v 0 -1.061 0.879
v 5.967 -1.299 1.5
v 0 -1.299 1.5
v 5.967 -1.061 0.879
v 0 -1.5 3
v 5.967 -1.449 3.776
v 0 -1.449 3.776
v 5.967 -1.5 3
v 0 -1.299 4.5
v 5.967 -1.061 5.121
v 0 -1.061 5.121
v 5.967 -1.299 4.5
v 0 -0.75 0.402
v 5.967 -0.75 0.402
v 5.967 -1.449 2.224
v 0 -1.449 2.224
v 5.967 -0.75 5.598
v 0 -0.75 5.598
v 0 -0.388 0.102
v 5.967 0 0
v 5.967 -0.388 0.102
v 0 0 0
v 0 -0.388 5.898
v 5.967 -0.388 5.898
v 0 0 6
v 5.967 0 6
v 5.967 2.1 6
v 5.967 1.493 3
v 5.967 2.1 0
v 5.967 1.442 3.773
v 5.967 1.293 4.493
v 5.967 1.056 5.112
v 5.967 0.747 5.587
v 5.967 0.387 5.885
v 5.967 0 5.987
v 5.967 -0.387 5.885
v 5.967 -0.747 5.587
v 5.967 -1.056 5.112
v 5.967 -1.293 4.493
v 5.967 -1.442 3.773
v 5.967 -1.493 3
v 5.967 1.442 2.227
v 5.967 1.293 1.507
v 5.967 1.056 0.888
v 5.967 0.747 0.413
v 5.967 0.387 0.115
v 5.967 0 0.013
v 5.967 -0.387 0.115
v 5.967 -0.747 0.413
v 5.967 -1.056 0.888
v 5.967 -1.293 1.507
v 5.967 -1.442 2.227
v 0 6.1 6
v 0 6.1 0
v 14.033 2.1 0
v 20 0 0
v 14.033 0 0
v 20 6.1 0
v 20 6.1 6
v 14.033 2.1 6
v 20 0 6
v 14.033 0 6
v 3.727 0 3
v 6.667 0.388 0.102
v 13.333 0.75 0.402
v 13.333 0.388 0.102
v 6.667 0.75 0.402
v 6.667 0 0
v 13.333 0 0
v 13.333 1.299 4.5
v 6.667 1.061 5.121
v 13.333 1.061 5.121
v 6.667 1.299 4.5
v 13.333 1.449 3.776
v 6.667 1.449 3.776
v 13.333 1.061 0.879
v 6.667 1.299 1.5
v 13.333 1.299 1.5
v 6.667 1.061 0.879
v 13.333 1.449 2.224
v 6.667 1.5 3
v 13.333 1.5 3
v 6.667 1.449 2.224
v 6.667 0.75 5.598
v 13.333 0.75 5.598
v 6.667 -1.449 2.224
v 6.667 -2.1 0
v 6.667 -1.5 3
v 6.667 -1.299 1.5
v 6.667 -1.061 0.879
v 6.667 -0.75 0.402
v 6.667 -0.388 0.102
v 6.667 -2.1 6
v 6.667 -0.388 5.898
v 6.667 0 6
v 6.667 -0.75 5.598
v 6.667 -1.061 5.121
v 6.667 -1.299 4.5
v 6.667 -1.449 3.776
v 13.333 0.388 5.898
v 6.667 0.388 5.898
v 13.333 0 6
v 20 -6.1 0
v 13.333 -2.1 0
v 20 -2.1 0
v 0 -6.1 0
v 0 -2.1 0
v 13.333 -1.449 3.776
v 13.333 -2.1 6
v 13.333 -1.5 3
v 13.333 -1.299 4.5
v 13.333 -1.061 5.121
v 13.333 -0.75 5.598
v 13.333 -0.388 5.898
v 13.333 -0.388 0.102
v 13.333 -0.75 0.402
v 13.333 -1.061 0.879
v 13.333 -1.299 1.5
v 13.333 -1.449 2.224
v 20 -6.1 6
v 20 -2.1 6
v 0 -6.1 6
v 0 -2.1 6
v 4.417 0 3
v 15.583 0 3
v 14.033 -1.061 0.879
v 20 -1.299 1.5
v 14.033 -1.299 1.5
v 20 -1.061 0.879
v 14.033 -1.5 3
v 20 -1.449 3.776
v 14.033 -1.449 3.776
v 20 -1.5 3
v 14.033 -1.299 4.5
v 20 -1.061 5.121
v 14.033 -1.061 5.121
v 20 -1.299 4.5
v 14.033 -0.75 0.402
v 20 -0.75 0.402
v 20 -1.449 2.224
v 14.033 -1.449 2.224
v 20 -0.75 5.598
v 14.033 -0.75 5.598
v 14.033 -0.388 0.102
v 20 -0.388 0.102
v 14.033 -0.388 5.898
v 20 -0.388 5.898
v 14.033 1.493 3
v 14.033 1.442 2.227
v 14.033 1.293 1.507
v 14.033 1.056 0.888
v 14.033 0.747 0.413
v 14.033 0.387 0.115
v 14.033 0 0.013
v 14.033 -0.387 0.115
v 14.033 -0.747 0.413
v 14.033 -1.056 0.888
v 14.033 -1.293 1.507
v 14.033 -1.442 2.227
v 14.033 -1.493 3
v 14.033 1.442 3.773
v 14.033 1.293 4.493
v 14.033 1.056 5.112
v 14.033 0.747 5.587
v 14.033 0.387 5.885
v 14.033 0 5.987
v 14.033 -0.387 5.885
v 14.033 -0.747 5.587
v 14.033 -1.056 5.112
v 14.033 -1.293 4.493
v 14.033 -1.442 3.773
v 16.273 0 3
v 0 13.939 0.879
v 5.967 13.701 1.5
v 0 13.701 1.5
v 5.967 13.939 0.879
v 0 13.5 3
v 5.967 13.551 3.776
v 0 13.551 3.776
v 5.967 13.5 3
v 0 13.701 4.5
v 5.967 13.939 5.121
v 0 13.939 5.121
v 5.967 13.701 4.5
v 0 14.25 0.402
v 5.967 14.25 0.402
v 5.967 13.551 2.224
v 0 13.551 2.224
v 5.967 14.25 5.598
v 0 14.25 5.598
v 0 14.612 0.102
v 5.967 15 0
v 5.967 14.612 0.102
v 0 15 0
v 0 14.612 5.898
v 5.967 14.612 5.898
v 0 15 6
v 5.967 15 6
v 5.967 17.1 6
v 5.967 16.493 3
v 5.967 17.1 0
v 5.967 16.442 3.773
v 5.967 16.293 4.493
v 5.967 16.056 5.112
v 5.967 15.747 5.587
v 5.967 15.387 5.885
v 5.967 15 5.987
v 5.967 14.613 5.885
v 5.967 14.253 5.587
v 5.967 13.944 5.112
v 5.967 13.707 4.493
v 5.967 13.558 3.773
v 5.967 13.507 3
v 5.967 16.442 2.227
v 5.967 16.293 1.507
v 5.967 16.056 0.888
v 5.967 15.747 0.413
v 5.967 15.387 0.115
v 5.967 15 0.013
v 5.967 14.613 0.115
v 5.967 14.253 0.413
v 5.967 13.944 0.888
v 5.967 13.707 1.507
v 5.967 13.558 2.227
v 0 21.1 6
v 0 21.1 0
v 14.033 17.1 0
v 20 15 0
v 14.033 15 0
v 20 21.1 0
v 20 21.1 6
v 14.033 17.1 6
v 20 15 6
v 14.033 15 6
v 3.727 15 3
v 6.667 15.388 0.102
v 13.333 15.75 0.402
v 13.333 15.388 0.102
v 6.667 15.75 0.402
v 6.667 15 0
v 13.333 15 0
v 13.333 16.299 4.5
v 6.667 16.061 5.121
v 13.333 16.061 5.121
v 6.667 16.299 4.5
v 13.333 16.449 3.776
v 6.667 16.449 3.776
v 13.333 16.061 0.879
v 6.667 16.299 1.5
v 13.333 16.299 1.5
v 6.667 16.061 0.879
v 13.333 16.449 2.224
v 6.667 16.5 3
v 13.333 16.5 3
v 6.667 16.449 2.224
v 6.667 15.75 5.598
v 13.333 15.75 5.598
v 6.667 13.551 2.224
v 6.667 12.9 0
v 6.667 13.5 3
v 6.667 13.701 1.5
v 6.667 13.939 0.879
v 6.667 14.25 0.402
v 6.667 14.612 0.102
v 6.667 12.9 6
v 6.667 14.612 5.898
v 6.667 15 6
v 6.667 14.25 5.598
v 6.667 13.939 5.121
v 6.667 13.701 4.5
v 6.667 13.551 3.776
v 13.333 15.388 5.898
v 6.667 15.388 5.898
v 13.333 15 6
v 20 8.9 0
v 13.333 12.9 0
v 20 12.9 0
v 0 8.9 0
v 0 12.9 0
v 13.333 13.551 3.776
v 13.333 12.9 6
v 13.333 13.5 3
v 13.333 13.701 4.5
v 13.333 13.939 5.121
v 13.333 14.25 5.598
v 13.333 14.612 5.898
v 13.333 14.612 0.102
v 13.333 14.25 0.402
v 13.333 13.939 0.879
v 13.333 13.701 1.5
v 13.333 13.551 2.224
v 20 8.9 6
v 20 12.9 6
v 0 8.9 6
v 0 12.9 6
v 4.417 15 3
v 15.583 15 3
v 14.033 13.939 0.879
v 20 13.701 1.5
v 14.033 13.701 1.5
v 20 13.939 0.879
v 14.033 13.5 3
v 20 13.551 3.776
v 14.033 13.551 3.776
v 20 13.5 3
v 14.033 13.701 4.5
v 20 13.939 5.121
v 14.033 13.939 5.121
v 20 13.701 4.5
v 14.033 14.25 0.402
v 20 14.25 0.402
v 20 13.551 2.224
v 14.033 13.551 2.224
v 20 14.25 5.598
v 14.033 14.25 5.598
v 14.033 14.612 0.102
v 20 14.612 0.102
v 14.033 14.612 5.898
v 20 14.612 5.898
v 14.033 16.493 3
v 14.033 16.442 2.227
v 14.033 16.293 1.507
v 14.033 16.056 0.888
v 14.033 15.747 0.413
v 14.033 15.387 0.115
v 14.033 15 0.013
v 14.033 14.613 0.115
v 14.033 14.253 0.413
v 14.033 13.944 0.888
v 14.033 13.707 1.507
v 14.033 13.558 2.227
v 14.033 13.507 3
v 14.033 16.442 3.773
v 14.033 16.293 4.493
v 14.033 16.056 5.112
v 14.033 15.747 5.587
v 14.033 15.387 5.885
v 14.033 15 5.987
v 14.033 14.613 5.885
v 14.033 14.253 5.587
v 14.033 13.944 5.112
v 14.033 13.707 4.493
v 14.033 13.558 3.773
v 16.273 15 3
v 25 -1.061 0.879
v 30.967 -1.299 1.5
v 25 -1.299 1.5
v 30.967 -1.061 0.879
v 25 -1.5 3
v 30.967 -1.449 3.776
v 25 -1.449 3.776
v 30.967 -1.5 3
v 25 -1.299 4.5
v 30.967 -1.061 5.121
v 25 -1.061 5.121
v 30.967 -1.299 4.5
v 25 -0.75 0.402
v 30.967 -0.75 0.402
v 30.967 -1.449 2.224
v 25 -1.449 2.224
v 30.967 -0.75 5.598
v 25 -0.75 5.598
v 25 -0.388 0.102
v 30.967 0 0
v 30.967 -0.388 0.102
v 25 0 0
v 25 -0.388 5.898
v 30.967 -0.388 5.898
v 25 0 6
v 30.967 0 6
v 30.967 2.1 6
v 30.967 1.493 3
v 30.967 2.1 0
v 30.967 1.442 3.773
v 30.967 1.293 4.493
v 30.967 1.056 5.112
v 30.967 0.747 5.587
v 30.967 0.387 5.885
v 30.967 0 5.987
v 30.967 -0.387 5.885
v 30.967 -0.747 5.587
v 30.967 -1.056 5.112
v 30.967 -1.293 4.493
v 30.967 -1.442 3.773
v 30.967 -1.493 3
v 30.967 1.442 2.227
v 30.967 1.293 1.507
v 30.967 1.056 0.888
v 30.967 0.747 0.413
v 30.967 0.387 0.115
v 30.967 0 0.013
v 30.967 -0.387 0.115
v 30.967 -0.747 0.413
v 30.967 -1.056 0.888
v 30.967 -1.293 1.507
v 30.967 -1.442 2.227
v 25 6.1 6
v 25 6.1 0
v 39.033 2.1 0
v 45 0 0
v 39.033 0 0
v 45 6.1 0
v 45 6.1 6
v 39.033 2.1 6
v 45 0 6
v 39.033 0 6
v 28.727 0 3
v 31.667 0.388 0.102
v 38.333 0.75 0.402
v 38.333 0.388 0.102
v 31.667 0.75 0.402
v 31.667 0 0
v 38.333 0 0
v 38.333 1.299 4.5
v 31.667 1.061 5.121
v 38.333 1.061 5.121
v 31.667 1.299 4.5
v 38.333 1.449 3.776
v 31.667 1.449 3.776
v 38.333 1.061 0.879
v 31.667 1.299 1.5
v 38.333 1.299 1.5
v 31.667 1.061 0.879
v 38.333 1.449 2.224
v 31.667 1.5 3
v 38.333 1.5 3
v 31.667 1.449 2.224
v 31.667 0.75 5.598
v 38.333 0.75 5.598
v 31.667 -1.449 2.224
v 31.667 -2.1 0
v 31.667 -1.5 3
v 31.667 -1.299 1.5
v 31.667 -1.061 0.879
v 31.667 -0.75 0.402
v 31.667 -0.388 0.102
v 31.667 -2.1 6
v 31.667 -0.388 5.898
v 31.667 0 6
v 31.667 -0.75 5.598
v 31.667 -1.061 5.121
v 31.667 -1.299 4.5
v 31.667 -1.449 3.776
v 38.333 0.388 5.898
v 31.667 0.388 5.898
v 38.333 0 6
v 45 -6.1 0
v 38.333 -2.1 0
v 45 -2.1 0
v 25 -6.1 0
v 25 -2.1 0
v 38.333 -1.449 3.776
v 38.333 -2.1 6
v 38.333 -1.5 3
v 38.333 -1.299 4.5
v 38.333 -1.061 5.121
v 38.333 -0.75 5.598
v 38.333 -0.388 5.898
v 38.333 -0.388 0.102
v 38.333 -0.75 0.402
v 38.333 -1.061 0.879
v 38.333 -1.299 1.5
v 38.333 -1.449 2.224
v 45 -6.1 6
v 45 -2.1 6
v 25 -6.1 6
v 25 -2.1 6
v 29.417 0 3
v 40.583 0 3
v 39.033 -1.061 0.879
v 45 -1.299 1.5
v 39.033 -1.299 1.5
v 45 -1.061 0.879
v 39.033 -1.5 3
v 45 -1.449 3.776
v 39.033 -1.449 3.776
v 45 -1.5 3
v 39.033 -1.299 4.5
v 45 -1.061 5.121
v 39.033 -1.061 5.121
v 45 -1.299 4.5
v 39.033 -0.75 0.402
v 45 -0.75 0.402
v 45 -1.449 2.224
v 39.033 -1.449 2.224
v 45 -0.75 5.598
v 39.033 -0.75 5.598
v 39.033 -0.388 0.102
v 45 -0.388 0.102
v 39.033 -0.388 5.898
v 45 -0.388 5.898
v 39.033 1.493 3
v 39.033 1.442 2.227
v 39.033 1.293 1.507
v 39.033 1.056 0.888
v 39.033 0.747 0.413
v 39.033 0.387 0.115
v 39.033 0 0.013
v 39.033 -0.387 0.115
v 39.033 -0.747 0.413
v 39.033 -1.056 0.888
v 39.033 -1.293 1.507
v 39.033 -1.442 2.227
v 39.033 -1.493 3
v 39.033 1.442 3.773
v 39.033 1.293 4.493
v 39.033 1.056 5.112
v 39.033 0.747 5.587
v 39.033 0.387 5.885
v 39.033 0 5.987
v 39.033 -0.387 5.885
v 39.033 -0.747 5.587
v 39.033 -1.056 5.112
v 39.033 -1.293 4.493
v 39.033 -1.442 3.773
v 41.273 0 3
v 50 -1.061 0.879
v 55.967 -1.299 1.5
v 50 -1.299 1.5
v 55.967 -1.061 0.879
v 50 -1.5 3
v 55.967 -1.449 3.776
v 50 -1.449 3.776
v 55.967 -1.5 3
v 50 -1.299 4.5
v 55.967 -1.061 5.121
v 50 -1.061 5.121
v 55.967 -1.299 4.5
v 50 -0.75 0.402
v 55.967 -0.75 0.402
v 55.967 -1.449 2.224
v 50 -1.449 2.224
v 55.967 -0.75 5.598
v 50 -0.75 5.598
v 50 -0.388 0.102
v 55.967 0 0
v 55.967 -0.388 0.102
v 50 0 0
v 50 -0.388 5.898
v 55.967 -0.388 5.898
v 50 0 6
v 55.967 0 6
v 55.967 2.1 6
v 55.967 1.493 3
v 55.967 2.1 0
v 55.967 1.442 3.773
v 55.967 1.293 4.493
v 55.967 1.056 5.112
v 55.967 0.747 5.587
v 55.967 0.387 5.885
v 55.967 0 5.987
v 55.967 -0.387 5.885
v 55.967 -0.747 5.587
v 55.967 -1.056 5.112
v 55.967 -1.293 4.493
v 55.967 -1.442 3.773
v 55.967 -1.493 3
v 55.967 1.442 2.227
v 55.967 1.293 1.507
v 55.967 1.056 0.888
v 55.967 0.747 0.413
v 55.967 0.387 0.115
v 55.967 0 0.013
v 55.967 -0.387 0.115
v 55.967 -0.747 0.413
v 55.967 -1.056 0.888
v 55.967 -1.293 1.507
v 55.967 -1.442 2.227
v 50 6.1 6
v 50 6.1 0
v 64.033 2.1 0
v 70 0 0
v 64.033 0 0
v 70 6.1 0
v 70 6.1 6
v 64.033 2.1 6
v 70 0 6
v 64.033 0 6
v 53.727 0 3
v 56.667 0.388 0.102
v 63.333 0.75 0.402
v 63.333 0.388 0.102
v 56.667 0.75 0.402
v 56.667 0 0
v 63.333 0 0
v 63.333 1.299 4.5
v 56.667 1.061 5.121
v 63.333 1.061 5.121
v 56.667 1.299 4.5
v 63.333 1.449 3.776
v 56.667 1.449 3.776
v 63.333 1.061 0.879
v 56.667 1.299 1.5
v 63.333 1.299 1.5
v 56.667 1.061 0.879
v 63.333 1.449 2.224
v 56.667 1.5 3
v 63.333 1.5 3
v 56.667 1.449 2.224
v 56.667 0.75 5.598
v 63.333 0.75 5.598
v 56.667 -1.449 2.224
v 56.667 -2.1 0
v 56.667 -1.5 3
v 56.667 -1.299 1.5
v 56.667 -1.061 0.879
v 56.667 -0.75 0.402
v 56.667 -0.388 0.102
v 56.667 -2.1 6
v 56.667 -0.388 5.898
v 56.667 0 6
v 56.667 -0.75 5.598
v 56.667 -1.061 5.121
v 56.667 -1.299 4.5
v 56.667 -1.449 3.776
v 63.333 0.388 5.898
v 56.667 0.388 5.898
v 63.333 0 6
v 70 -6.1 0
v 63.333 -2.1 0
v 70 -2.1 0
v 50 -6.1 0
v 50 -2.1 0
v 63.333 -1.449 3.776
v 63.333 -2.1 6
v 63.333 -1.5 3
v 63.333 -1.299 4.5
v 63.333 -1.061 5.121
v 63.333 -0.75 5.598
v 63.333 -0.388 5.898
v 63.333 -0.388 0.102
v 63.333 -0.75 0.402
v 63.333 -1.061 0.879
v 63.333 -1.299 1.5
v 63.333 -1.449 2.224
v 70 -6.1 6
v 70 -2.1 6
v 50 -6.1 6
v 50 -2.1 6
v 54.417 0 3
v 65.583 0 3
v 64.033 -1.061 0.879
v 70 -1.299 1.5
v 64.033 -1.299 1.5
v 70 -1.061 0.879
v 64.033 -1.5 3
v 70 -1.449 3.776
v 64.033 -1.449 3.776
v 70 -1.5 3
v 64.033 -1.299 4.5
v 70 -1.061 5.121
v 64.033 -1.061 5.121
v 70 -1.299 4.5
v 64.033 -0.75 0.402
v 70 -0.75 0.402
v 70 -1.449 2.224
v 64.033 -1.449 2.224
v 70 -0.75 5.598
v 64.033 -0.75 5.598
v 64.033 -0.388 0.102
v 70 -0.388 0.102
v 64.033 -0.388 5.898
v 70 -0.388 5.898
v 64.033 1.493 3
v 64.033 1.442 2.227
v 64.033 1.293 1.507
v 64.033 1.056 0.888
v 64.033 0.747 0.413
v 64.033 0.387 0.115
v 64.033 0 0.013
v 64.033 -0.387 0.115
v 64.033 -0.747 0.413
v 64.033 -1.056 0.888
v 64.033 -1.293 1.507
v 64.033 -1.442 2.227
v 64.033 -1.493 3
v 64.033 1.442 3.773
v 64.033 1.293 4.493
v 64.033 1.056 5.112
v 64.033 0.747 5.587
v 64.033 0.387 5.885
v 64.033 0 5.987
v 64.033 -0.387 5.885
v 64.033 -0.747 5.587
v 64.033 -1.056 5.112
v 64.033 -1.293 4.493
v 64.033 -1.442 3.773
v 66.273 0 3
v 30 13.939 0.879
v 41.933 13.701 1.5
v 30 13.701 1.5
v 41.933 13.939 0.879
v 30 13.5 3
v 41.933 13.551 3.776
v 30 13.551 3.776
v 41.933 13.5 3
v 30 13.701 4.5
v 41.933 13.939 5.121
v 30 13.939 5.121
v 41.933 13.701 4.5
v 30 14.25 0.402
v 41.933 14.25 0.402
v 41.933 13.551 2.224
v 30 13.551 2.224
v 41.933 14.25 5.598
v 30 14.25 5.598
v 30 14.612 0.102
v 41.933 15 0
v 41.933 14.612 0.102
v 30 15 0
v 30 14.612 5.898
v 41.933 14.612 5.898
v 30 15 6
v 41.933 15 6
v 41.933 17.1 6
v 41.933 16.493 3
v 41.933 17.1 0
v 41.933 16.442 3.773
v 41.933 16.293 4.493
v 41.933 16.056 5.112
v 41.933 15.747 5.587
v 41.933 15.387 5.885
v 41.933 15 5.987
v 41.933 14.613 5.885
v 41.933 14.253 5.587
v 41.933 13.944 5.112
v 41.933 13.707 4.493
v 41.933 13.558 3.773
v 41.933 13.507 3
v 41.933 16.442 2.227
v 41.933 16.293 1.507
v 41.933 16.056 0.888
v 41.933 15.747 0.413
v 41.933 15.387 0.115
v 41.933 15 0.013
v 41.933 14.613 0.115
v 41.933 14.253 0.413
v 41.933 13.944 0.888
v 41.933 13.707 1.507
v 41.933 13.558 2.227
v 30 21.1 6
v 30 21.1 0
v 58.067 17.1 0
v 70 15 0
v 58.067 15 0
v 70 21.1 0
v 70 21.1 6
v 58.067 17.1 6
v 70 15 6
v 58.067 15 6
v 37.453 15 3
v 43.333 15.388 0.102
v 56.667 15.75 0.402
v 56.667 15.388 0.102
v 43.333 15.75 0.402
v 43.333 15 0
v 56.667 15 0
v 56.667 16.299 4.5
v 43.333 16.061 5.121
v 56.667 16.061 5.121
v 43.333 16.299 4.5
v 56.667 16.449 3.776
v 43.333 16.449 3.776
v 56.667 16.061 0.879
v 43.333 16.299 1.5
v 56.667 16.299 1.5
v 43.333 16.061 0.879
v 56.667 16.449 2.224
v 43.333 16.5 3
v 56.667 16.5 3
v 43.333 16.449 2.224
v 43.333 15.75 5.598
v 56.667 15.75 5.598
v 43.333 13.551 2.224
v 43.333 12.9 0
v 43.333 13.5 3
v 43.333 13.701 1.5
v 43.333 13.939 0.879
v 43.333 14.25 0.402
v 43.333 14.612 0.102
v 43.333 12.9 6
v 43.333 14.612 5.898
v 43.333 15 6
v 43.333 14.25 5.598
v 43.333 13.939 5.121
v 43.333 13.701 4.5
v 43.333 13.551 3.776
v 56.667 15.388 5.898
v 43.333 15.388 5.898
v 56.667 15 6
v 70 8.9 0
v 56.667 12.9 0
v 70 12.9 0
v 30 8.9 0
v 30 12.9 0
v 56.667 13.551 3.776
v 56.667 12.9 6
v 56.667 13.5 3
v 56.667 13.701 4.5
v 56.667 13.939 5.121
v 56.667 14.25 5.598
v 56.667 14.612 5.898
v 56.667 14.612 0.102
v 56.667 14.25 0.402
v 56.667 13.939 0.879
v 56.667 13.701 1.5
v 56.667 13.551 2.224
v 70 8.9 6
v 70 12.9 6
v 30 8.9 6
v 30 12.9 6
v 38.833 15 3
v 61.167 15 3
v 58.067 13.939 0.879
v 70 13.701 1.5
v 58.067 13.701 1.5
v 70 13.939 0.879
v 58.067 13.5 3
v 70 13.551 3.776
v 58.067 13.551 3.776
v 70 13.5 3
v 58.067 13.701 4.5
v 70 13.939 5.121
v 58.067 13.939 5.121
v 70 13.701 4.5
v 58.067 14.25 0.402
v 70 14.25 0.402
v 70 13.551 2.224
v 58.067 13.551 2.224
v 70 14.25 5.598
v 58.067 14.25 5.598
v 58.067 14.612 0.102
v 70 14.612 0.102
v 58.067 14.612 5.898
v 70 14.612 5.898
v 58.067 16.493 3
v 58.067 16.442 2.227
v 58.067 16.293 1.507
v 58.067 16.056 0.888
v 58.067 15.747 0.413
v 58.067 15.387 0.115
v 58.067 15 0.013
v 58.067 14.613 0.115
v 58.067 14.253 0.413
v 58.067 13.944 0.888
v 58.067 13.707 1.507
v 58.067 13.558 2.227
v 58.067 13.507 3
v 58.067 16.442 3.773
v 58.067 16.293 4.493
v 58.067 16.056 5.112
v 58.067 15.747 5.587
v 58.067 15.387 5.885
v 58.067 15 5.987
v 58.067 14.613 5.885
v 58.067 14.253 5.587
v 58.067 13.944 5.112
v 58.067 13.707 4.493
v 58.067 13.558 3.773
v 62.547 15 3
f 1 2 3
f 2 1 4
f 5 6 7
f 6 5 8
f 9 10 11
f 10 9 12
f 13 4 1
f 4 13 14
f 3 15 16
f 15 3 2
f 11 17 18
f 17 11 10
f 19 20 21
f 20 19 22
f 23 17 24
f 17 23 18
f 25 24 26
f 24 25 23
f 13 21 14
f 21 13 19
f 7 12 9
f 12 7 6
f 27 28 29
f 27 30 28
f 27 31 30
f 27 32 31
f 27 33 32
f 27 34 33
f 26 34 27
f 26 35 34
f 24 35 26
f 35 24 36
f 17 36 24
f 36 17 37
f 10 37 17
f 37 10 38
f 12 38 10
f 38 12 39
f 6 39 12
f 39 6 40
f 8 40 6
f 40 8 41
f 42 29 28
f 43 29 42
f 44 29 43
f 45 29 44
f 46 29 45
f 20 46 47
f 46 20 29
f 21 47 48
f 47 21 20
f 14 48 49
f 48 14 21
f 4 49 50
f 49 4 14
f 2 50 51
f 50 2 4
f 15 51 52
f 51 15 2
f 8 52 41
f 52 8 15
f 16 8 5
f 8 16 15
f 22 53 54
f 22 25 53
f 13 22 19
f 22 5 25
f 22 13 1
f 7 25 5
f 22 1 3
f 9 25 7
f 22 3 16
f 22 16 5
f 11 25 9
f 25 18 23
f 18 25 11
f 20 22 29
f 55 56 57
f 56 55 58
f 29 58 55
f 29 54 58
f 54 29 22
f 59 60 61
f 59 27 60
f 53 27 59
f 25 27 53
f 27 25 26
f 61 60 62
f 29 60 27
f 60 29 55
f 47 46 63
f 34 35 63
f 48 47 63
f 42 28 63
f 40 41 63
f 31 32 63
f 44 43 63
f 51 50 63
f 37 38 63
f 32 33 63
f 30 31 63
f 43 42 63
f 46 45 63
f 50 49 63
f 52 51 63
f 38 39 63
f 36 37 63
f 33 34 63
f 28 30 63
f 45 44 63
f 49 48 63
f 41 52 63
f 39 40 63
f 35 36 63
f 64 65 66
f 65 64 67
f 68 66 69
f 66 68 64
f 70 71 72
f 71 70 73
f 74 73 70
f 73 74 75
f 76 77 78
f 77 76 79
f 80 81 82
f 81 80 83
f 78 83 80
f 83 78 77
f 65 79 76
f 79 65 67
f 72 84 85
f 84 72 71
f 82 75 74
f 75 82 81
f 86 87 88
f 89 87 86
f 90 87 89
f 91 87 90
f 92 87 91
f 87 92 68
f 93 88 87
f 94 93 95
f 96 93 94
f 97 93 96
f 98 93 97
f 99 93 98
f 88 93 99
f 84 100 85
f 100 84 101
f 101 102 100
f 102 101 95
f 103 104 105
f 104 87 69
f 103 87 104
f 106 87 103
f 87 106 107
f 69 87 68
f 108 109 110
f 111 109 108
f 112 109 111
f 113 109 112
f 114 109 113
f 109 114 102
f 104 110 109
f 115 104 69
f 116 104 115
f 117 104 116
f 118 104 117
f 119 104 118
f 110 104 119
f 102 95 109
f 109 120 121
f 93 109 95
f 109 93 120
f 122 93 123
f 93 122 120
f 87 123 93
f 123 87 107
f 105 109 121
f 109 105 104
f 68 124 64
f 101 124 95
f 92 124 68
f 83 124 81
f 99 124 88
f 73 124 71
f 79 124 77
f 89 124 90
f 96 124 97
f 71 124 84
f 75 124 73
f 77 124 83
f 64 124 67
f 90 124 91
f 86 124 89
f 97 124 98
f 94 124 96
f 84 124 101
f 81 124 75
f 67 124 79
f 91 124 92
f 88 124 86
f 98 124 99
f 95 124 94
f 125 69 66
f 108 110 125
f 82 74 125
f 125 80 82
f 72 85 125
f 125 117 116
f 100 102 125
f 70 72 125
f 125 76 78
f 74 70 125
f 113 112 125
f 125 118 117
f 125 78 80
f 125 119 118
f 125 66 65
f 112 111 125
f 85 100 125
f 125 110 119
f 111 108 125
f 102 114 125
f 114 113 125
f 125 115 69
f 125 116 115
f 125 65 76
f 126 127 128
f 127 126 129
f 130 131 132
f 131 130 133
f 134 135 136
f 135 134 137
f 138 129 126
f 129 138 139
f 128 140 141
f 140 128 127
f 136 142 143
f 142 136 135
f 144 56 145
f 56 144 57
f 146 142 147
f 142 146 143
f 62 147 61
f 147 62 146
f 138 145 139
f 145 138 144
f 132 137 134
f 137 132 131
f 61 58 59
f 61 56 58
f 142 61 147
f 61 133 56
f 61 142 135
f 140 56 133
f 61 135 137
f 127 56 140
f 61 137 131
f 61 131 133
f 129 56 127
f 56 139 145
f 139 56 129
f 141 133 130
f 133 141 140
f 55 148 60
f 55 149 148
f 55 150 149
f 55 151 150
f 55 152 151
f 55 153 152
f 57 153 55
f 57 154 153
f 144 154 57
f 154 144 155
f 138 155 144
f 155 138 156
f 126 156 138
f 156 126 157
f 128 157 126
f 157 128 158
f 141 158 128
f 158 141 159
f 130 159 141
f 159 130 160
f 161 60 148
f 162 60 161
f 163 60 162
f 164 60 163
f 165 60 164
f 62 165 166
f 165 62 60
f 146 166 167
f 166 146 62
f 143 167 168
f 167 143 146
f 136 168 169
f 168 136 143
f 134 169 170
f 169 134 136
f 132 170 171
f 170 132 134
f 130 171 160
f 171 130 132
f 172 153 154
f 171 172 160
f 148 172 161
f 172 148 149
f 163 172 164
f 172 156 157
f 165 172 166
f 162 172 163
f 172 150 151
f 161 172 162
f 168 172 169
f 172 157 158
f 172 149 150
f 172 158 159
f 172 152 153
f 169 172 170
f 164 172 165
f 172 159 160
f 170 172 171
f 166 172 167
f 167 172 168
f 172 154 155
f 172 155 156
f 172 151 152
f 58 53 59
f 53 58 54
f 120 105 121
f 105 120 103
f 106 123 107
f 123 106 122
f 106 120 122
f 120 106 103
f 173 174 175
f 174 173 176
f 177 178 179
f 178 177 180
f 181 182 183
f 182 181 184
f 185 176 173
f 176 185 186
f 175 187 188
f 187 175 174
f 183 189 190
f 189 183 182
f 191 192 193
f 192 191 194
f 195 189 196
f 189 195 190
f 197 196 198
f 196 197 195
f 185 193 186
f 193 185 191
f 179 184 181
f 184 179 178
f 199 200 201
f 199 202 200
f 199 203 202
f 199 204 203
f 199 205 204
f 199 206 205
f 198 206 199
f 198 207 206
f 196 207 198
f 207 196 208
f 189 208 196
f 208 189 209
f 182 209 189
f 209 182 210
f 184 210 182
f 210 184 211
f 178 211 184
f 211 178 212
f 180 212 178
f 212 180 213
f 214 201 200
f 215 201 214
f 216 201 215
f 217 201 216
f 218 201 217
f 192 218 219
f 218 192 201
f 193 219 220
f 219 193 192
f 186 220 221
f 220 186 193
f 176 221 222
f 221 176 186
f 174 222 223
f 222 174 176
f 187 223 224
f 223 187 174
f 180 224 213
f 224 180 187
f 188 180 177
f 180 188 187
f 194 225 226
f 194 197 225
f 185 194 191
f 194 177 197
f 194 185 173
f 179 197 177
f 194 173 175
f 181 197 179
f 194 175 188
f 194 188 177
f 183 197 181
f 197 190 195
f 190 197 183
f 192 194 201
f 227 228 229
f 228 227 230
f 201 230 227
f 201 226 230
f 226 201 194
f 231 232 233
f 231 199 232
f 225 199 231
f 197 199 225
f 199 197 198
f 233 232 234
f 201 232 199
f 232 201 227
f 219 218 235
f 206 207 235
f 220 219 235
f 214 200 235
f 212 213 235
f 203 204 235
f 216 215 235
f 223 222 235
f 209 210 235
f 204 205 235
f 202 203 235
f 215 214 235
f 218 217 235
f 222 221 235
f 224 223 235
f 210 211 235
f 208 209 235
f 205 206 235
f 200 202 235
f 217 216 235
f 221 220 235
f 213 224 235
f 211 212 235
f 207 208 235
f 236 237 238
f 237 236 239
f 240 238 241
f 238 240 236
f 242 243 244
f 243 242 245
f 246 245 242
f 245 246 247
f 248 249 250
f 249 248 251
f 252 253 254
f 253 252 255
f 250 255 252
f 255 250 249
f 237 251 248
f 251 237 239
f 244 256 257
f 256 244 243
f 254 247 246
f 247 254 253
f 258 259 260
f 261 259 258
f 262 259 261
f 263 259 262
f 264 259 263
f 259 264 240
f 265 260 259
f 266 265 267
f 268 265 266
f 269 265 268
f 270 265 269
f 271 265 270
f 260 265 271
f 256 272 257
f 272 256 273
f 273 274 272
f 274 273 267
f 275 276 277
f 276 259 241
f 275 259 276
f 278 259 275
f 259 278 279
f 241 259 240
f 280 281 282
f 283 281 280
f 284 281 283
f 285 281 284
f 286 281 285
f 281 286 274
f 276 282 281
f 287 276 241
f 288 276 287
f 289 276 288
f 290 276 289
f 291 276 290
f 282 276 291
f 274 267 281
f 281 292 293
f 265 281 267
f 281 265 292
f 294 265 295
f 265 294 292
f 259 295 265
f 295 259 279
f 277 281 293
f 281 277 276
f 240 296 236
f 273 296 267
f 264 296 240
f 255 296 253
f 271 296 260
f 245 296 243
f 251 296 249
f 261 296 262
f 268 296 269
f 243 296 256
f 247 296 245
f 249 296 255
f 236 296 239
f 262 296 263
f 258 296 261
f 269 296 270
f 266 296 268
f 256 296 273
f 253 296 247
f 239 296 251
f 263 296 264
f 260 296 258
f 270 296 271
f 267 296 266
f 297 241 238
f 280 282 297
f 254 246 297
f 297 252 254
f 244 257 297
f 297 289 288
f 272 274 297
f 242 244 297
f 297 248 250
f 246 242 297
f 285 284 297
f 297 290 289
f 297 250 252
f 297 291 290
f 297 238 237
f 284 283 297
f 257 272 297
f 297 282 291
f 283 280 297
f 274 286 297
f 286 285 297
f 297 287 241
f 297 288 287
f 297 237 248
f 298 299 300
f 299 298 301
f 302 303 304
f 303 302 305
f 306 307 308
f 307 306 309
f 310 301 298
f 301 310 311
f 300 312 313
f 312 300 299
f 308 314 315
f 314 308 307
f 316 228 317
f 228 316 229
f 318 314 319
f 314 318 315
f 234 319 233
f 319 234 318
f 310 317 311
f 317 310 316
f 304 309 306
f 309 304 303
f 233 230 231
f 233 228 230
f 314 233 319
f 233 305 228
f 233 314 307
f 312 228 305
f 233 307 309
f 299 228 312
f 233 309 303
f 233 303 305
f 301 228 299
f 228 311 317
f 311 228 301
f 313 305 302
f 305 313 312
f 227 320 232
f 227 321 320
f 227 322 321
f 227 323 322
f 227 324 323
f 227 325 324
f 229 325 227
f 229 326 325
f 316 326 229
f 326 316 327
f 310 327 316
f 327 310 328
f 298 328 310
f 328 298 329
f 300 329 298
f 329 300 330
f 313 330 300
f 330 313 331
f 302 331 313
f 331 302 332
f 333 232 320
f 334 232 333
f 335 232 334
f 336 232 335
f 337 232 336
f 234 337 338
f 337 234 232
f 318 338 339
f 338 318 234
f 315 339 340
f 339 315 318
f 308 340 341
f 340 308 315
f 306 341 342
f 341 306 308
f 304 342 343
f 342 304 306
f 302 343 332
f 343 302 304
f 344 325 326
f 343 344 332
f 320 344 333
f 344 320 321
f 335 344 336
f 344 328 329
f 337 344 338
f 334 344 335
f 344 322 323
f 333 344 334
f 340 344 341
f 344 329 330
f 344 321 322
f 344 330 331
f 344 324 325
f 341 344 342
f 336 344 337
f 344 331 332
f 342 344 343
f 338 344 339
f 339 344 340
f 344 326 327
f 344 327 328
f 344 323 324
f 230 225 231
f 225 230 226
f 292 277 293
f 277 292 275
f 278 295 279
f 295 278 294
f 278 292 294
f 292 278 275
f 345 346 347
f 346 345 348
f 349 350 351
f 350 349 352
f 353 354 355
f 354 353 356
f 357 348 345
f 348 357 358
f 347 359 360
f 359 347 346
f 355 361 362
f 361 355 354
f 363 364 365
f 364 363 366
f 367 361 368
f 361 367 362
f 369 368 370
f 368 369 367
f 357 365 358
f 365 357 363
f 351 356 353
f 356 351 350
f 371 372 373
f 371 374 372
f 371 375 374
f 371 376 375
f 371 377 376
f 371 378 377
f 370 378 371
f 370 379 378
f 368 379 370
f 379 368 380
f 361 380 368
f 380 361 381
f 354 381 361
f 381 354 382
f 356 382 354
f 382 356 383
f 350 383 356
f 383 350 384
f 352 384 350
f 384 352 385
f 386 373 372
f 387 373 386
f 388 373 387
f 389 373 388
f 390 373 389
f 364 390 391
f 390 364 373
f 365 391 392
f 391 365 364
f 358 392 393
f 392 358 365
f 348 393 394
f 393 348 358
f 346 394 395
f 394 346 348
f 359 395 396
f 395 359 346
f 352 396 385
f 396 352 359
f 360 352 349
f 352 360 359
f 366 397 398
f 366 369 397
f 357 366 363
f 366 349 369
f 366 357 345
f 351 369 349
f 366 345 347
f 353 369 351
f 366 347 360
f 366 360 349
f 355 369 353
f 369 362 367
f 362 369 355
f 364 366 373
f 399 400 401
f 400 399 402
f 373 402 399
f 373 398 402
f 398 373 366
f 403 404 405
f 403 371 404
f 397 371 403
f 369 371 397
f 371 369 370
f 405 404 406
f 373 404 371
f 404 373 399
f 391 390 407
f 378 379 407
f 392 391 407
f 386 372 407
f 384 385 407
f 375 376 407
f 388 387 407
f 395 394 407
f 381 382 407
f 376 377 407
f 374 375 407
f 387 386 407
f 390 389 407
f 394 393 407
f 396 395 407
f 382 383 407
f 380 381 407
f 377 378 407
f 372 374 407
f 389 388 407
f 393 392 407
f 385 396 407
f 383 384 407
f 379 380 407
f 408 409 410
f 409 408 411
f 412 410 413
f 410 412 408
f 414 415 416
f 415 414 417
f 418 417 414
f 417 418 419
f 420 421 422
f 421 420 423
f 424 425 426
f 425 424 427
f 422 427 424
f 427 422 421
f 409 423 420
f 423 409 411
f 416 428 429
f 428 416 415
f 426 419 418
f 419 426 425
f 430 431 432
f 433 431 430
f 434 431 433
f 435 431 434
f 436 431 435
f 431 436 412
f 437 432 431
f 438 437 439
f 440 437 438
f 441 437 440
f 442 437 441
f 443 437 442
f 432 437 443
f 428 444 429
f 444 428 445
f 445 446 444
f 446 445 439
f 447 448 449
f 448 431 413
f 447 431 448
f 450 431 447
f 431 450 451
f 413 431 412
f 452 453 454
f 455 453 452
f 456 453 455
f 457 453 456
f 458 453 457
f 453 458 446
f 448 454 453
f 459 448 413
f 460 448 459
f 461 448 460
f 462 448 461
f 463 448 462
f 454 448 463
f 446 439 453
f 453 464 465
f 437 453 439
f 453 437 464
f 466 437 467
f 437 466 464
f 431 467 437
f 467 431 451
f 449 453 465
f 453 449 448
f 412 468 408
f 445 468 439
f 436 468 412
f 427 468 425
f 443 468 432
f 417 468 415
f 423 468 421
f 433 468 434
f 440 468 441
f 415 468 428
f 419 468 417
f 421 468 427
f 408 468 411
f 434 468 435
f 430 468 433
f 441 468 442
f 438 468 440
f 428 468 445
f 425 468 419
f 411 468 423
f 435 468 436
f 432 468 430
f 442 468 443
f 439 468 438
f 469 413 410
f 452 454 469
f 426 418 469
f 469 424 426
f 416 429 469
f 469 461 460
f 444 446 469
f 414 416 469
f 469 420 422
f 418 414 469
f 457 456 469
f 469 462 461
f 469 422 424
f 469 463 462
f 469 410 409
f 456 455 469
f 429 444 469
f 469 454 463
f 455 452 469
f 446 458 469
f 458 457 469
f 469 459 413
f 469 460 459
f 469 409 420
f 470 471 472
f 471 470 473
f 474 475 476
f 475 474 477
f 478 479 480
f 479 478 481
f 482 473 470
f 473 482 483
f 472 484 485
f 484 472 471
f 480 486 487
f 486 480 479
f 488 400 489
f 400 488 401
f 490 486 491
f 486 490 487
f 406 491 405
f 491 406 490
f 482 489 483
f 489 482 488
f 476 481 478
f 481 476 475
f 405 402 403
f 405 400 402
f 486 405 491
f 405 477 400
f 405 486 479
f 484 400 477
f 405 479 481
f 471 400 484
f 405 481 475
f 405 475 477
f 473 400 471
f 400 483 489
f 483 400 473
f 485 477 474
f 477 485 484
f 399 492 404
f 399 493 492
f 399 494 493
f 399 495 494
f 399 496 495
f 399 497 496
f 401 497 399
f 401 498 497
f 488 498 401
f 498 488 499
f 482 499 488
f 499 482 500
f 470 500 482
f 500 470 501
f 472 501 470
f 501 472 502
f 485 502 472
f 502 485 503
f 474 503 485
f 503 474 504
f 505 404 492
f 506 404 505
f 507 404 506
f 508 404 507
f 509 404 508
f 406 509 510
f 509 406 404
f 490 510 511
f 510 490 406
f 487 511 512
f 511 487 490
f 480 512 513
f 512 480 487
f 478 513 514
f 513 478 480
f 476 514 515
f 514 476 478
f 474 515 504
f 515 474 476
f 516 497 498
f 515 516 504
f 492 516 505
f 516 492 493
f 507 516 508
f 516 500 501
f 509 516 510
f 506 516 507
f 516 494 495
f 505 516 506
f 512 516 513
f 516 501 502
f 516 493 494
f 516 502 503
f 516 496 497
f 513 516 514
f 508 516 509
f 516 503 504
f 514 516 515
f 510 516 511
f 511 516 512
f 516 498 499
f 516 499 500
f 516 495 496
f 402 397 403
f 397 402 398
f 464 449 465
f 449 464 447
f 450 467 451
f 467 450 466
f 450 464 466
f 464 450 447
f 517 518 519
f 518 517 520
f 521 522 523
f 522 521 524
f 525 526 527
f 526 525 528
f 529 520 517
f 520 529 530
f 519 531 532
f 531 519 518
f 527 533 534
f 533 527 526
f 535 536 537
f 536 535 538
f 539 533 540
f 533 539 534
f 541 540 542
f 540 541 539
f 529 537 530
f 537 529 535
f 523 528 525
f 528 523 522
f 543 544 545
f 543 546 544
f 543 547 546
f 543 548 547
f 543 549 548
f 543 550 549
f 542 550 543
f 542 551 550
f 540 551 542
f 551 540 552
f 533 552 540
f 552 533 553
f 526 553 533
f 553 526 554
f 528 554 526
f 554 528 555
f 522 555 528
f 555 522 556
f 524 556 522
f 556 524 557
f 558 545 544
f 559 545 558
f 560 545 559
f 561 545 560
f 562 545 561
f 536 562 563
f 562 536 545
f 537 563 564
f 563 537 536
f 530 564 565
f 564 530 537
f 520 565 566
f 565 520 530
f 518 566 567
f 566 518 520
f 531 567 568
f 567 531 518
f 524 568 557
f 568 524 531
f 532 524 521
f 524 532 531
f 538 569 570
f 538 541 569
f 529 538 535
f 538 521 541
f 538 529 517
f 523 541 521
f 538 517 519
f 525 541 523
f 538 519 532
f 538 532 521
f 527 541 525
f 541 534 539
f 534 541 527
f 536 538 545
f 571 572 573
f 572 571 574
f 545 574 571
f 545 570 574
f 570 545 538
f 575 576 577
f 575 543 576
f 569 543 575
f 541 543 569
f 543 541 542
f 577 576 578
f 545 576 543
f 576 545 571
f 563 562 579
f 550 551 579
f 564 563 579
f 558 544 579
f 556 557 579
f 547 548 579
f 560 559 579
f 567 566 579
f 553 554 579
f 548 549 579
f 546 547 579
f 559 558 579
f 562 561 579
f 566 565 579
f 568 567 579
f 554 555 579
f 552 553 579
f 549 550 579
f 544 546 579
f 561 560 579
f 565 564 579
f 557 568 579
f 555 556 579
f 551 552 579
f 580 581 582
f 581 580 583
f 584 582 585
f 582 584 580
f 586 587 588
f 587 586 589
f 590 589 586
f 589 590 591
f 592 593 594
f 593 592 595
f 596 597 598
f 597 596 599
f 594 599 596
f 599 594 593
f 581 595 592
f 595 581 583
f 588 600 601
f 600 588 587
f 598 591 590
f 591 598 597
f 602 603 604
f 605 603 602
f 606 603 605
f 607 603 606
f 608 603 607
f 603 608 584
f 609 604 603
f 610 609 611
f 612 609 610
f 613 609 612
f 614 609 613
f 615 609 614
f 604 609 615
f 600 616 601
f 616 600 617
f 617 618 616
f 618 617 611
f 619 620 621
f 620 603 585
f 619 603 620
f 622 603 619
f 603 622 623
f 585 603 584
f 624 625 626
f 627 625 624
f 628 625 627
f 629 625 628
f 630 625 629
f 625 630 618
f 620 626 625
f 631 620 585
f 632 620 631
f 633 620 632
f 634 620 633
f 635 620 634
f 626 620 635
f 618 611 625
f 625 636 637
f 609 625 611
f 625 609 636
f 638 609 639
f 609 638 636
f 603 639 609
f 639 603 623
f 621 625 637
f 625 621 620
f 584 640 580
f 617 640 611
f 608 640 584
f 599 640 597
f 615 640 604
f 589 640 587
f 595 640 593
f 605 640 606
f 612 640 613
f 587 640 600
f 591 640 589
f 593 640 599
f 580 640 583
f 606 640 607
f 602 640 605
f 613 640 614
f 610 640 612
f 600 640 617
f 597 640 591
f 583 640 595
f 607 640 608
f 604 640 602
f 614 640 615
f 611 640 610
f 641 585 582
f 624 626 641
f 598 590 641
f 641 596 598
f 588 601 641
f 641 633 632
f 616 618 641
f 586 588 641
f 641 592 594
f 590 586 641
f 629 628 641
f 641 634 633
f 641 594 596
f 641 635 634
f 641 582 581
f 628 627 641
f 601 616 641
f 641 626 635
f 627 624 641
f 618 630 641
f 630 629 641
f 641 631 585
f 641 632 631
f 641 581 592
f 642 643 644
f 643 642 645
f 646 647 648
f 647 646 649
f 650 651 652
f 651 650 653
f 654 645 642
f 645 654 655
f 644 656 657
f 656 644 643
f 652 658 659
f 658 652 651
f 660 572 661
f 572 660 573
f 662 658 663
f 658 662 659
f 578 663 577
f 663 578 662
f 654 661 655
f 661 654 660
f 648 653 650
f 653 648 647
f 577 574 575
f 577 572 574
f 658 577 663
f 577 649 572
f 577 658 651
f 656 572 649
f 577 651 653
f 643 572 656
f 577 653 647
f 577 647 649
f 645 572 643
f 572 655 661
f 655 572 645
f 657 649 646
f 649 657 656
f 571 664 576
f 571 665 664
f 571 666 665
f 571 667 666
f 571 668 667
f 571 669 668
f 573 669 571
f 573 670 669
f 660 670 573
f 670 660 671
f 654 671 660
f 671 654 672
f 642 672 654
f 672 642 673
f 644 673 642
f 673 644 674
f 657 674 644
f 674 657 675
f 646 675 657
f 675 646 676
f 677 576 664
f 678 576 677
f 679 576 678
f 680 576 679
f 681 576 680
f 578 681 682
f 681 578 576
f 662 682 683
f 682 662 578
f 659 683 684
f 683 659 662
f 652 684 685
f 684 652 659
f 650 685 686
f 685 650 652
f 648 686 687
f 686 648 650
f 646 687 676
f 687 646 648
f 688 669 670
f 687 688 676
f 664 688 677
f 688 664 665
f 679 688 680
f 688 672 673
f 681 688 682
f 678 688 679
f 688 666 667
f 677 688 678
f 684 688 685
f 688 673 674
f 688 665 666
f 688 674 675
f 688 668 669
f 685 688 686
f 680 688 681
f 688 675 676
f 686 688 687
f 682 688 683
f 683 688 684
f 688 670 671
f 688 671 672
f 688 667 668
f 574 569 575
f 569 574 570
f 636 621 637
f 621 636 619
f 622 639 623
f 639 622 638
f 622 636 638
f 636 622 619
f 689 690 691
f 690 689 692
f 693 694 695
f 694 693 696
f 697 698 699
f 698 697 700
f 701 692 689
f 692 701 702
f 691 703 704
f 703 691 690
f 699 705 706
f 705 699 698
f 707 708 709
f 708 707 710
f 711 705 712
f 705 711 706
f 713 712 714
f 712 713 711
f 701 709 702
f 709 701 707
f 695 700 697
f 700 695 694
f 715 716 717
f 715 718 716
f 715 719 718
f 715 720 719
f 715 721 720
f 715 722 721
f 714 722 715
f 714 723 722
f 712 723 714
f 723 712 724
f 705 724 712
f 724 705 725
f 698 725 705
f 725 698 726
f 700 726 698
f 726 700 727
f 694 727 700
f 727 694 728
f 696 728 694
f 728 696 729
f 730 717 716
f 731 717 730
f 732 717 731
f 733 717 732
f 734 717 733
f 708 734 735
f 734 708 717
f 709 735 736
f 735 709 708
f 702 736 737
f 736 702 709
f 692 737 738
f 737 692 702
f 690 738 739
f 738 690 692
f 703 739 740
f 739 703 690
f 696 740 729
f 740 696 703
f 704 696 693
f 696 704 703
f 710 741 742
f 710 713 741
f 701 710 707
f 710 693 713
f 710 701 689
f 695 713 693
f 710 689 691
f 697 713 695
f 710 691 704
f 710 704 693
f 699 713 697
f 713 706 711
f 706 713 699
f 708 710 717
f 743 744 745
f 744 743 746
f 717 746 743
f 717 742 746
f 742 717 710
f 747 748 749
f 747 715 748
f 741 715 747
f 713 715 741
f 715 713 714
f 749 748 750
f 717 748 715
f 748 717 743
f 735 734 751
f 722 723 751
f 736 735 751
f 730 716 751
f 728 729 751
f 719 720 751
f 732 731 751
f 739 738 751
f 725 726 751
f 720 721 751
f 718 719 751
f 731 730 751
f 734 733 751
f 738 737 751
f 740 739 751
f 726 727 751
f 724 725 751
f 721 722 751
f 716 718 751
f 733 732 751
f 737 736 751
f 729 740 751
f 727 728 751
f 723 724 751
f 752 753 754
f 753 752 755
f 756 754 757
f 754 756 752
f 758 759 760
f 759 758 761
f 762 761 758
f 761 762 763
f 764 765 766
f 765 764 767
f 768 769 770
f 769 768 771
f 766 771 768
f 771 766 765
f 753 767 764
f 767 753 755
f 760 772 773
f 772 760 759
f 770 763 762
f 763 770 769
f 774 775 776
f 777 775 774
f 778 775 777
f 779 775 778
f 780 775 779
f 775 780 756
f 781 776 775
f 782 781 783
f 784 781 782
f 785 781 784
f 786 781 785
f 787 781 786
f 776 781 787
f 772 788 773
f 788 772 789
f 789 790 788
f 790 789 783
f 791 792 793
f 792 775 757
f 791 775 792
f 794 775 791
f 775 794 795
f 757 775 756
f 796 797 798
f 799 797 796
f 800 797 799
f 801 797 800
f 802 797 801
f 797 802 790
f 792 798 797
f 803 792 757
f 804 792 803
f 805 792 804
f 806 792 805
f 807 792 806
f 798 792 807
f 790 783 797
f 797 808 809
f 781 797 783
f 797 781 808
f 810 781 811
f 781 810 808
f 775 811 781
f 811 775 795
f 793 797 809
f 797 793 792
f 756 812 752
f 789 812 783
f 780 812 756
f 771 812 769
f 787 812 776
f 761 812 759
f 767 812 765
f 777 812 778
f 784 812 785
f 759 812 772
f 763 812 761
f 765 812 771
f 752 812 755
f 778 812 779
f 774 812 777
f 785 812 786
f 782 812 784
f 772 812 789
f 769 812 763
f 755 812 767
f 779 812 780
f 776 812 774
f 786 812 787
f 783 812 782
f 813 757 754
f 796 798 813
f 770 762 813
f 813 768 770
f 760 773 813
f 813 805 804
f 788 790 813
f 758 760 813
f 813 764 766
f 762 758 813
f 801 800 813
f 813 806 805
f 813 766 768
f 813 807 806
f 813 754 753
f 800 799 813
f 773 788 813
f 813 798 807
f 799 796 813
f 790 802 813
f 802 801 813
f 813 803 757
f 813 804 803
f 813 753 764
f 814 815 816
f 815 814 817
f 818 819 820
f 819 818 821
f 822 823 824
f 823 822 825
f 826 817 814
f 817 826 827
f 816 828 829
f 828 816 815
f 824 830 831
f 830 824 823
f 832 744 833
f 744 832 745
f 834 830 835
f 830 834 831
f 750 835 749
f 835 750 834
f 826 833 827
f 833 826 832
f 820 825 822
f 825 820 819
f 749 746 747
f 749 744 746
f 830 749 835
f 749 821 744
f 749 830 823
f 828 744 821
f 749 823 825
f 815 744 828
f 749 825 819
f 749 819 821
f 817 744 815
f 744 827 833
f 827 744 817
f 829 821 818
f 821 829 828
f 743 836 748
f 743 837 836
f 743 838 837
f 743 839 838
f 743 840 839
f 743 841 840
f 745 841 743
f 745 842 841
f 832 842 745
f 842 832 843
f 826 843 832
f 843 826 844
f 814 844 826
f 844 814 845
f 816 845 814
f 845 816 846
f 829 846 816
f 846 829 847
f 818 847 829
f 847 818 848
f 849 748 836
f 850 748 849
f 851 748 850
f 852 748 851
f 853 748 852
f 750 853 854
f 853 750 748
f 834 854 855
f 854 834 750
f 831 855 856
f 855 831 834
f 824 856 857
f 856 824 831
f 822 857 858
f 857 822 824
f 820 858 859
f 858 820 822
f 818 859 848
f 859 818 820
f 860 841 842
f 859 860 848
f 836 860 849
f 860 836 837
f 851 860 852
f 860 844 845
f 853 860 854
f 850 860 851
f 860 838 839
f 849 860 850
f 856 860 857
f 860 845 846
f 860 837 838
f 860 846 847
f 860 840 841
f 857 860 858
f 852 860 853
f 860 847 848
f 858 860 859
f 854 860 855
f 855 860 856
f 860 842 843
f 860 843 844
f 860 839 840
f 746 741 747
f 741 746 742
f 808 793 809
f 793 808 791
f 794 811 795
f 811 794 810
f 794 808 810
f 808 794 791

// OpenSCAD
// file: mathhinge.scad
module math_hinge(){// mathgrrl cone hinge

//////////////////////////////////////////////////////
// parameters

// Length of the complete hinge
length = 20;

// Height (diameter) of the hinge
height = 3;

// Clearance between cones and holes
clearance = .7;		

// Clearance between hinge and sides
gap = .6; 				

// Parameters that the user does not get to specify
$fn=24*1;
border = 2*1; 
fudge = .01*1;			// to preserve mesh integrity
corner = 0*1;      	// space between hinge and corner
hinge_radius = height/2;
cone_height = 1.5*hinge_radius;  

//////////////////////////////////////////////////////
// renders

rotate(90,[0,1,0]) 
	translate([-hinge_radius,0,0])
		hinge();

translate([0,hinge_radius+gap,0]) bar();
translate([0,-2*border-hinge_radius-gap,0]) bar();

//translate([0,hinge_radius+gap,0]) square();
//translate([0,-length-hinge_radius-gap,0]) square();


//////////////////////////////////////////////////////
// module for hinge

module hinge(){
	rad = hinge_radius;
	clr = clearance;
	len = (length-2*corner)/3; 
	con = cone_height;
	// left outside hinge = (cylinder+box)-cone
	difference(){
		union(){
			translate([0,0,corner]) cylinder(h=len-clr,r=rad);
			translate([-rad,0,corner]) cube([2*rad,rad+gap,len-clr]);
		}
		translate([0,0,corner+len-con-clr+fudge]) cylinder(h=con,r1=0,r2=rad);
	}
	// inside hinge = cylinder+box+cone+cone
	union(){
		translate([0,0,corner+len]) cylinder(h=len,r=rad);
		translate([-rad,-rad-gap,corner+len]) cube([2*rad,rad+gap,len]);
		translate([0,0,corner+len-con]) cylinder(h=con,r1=0,r2=rad);
		translate([0,0,corner+2*len]) cylinder(h=con,r1=rad,r2=0);
	}
	// right outside hinge = (cylinder+box)-cone
	difference(){
		union(){
			translate([0,0,corner+2*len+clr]) cylinder(h=len-clr,r=rad);
			translate([-rad,0,corner+2*len+clr]) cube([2*rad,rad+gap,len-clr]);
		}
		translate([0,0,corner+2*len+clr-fudge]) cylinder(h=con,r1=rad,r2=0);	
	}
}

//////////////////////////////////////////////////////
// module for square shape

module square(){
	difference(){
		cube([length,length,height]);
		translate([border,border,-fudge])
			cube(	[length-2*border,length-2*border,height+2*fudge]);
	}
}

//////////////////////////////////////////////////////
// module for bar shape

module bar(){
	cube([length,2*border,height]);
}
}
math_hinge();
// main file
use <mathhinge.scad>;

scale([1,1,2]) math_hinge();

scale([1,1,2]) translate([0, 15, 0]) math_hinge();

scale([1,1,2]) translate([25, 0, 0]) math_hinge();

scale([1,1,2]) translate([50, 0, 0]) math_hinge();

translate([30, 15, 0]) scale([2, 1, 2]) math_hinge();
